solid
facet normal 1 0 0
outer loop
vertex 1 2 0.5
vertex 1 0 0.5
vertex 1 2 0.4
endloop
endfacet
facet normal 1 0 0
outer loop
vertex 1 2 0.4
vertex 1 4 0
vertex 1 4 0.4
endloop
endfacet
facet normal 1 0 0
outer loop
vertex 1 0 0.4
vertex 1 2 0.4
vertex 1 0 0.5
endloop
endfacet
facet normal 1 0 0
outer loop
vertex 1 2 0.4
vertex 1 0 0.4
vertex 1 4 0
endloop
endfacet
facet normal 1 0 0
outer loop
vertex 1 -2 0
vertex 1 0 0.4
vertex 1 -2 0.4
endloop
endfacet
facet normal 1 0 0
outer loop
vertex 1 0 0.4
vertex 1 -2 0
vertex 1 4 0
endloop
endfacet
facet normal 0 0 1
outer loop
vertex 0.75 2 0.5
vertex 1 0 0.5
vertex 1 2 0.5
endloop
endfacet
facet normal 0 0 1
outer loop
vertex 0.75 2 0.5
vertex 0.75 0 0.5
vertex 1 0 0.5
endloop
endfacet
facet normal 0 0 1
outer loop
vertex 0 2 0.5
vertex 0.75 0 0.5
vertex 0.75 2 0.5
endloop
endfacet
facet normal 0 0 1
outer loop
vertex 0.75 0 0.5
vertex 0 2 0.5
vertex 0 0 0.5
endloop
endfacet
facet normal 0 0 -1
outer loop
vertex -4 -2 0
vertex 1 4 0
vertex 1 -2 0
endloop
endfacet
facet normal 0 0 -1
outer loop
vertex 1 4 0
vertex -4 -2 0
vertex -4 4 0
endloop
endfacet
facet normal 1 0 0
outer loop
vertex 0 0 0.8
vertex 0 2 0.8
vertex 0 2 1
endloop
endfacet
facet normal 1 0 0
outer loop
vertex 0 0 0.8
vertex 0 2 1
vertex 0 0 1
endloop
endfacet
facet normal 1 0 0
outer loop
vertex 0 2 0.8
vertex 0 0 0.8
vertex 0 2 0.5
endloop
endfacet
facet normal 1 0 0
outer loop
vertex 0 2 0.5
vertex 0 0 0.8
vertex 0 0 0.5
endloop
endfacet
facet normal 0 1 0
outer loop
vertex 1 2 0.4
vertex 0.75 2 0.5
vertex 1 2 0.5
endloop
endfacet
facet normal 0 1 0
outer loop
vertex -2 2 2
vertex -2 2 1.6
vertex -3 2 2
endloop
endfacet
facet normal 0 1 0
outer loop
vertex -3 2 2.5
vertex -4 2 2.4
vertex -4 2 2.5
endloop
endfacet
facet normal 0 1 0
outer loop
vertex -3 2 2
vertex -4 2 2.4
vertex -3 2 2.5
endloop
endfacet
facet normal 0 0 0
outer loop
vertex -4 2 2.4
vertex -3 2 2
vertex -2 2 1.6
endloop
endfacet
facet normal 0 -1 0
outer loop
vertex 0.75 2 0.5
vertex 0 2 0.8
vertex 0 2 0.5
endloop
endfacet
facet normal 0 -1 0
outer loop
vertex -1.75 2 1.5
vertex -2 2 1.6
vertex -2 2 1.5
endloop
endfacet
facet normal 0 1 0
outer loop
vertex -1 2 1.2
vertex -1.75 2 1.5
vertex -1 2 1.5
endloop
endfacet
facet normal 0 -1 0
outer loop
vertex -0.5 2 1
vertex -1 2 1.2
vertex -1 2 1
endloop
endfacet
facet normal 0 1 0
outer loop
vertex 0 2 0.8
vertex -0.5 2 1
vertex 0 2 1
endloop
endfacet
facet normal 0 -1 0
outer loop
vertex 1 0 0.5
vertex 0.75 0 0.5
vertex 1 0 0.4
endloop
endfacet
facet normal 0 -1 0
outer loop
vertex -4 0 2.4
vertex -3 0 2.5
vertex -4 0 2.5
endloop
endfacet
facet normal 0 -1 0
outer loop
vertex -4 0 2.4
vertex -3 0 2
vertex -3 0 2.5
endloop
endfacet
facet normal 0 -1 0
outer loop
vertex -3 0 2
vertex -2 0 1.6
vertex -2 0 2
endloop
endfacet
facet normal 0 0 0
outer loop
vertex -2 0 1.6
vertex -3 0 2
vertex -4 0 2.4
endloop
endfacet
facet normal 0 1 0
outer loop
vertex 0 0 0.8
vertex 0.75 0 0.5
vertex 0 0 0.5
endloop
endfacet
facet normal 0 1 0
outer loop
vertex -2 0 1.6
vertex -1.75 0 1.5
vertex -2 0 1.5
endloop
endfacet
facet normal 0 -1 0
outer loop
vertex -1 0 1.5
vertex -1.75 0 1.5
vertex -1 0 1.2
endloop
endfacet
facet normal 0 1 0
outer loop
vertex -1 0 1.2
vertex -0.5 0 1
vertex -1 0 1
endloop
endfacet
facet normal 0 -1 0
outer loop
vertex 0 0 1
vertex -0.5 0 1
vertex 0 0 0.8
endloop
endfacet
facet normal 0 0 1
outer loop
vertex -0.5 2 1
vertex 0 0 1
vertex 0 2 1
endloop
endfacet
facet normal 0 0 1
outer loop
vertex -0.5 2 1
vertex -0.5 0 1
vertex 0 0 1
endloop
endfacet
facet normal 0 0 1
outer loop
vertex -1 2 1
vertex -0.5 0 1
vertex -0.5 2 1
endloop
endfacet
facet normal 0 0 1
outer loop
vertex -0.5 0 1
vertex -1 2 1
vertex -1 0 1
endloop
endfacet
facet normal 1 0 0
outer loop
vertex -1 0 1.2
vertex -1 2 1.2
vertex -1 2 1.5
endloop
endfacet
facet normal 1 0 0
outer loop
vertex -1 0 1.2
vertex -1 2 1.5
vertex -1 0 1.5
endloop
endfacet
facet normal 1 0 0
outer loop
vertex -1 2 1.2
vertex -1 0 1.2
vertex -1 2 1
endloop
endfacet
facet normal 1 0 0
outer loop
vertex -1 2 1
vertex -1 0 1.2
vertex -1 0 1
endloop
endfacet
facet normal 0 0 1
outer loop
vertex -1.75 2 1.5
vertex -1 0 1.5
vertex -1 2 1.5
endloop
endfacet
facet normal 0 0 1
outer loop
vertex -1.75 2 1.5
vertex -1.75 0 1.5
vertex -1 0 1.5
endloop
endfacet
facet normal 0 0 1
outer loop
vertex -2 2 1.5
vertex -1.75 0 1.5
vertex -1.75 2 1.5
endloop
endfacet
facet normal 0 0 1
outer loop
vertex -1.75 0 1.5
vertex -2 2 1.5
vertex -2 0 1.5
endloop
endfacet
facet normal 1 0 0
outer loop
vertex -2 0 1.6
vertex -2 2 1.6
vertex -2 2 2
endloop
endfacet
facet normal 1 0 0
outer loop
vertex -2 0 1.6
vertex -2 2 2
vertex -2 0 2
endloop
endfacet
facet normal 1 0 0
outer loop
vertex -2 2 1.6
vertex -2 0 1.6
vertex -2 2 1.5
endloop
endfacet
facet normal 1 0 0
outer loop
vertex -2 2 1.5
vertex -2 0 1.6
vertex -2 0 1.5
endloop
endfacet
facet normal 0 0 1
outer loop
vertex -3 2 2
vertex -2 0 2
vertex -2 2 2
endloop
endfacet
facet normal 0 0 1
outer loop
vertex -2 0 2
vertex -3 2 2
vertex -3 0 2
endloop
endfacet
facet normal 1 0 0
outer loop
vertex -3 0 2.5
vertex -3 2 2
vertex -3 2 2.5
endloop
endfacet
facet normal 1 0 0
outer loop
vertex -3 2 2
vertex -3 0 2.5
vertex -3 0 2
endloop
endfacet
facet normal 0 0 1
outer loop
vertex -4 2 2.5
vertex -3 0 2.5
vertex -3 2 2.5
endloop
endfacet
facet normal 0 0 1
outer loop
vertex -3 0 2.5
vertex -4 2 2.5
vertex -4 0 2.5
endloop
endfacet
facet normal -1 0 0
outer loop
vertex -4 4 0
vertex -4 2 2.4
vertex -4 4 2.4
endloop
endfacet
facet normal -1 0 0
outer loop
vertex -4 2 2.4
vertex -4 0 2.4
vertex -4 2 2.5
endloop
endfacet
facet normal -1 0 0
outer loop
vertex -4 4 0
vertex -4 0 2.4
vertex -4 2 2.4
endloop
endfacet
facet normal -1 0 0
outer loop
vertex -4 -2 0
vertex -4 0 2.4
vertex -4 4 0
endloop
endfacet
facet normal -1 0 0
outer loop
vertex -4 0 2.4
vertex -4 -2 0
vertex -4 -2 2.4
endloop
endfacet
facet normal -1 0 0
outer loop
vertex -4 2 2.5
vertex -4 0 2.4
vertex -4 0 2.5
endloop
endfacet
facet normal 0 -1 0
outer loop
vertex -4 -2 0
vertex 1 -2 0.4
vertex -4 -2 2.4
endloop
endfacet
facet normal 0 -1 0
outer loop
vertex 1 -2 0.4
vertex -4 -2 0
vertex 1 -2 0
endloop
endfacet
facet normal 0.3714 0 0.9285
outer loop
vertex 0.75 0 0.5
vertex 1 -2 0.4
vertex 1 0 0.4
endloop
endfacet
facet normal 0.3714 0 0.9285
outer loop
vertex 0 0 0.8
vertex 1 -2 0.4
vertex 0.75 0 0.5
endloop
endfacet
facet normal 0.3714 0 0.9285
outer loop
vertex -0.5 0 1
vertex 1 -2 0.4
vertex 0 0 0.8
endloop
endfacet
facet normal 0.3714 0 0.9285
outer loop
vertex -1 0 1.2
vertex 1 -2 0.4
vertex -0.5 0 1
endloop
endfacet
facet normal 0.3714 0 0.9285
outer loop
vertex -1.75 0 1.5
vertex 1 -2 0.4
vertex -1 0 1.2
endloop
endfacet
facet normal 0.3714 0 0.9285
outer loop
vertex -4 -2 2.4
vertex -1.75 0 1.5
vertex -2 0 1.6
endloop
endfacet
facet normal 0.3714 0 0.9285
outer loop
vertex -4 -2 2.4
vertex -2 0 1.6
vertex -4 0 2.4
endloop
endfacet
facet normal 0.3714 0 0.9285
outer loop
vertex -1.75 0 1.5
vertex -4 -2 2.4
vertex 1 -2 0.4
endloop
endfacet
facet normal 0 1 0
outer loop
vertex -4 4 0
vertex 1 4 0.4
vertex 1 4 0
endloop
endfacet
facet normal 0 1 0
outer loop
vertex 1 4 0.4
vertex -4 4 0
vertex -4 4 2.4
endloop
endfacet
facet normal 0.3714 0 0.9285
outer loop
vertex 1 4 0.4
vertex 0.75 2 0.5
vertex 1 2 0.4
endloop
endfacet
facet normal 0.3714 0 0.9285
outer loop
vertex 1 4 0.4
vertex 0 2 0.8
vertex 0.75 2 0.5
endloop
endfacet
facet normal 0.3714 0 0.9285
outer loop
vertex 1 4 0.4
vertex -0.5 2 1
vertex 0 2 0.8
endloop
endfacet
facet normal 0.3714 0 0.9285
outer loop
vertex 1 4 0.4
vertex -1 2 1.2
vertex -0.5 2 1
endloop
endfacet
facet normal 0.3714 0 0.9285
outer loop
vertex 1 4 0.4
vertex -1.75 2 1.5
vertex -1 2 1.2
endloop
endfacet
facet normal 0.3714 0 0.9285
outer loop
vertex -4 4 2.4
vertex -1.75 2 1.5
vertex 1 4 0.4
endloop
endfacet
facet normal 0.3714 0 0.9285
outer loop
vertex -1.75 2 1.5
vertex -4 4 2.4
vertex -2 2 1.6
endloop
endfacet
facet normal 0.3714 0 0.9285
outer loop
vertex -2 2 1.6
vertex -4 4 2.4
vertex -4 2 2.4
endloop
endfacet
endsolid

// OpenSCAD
module Stairs_01(){

    color("#cdaa7d"){
    
    translate([0,-0,0])
    cube([1,2,0.5]);

    translate([-1,-0,0])
    cube([1,2,1]);

    translate([-2,-0,0])
    cube([1,2,1.5]);

    translate([-3,-0,0])
    cube([1,2,2]);

    translate([-4,-0,0])
    cube([1,2,2.5]);
    }
    
    color("gray")
    translate([-1.5,-1,0.2])
    cube([5,2,0.4], center = true);
    
    
    rotate([90,0,180])
    color("gray")
    translate([-1,0.4,-2])
    linear_extrude(2)
    polygon(points=[[0,0],[5,2],[5,0]]); 
    
     
    color("gray")
    translate([-1.5,3,0.2])
    cube([5,2,0.4], center = true);
  
    rotate([90,0,180])
    color("gray")
    translate([-1,0.4,2])
    linear_extrude(2)
    polygon(points=[[0,0],[5,2],[5,0]]); 
    
    
    
}

Stairs_01();

// Written by Nicolì Angelo (Gengio) 2024: 
// MIT License

//Permission is hereby granted, free of charge, to any person obtaining a copy of this software and associated documentation files (the "Software"), to deal in the Software without restriction, including without limitation the rights to use, copy, modify, merge, publish, distribute, sublicense, and/or sell copies of the Software, and to permit persons to whom the Software is furnished to do so, subject to the following conditions:

//The above copyright notice and this permission notice shall be included in all copies or substantial portions of the Software.

//THE SOFTWARE IS PROVIDED "AS IS", WITHOUT WARRANTY OF ANY KIND, EXPRESS OR IMPLIED, INCLUDING BUT NOT LIMITED TO THE WARRANTIES OF MERCHANTABILITY, FITNESS FOR A PARTICULAR PURPOSE AND NONINFRINGEMENT. IN NO EVENT SHALL THE AUTHORS OR COPYRIGHT HOLDERS BE LIABLE FOR ANY CLAIM, DAMAGES OR OTHER LIABILITY, WHETHER IN AN ACTION OF CONTRACT, TORT OR OTHERWISE, ARISING FROM, OUT OF OR IN CONNECTION WITH THE SOFTWARE OR THE USE OR OTHER DEALINGS IN THE SOFTWARE.
